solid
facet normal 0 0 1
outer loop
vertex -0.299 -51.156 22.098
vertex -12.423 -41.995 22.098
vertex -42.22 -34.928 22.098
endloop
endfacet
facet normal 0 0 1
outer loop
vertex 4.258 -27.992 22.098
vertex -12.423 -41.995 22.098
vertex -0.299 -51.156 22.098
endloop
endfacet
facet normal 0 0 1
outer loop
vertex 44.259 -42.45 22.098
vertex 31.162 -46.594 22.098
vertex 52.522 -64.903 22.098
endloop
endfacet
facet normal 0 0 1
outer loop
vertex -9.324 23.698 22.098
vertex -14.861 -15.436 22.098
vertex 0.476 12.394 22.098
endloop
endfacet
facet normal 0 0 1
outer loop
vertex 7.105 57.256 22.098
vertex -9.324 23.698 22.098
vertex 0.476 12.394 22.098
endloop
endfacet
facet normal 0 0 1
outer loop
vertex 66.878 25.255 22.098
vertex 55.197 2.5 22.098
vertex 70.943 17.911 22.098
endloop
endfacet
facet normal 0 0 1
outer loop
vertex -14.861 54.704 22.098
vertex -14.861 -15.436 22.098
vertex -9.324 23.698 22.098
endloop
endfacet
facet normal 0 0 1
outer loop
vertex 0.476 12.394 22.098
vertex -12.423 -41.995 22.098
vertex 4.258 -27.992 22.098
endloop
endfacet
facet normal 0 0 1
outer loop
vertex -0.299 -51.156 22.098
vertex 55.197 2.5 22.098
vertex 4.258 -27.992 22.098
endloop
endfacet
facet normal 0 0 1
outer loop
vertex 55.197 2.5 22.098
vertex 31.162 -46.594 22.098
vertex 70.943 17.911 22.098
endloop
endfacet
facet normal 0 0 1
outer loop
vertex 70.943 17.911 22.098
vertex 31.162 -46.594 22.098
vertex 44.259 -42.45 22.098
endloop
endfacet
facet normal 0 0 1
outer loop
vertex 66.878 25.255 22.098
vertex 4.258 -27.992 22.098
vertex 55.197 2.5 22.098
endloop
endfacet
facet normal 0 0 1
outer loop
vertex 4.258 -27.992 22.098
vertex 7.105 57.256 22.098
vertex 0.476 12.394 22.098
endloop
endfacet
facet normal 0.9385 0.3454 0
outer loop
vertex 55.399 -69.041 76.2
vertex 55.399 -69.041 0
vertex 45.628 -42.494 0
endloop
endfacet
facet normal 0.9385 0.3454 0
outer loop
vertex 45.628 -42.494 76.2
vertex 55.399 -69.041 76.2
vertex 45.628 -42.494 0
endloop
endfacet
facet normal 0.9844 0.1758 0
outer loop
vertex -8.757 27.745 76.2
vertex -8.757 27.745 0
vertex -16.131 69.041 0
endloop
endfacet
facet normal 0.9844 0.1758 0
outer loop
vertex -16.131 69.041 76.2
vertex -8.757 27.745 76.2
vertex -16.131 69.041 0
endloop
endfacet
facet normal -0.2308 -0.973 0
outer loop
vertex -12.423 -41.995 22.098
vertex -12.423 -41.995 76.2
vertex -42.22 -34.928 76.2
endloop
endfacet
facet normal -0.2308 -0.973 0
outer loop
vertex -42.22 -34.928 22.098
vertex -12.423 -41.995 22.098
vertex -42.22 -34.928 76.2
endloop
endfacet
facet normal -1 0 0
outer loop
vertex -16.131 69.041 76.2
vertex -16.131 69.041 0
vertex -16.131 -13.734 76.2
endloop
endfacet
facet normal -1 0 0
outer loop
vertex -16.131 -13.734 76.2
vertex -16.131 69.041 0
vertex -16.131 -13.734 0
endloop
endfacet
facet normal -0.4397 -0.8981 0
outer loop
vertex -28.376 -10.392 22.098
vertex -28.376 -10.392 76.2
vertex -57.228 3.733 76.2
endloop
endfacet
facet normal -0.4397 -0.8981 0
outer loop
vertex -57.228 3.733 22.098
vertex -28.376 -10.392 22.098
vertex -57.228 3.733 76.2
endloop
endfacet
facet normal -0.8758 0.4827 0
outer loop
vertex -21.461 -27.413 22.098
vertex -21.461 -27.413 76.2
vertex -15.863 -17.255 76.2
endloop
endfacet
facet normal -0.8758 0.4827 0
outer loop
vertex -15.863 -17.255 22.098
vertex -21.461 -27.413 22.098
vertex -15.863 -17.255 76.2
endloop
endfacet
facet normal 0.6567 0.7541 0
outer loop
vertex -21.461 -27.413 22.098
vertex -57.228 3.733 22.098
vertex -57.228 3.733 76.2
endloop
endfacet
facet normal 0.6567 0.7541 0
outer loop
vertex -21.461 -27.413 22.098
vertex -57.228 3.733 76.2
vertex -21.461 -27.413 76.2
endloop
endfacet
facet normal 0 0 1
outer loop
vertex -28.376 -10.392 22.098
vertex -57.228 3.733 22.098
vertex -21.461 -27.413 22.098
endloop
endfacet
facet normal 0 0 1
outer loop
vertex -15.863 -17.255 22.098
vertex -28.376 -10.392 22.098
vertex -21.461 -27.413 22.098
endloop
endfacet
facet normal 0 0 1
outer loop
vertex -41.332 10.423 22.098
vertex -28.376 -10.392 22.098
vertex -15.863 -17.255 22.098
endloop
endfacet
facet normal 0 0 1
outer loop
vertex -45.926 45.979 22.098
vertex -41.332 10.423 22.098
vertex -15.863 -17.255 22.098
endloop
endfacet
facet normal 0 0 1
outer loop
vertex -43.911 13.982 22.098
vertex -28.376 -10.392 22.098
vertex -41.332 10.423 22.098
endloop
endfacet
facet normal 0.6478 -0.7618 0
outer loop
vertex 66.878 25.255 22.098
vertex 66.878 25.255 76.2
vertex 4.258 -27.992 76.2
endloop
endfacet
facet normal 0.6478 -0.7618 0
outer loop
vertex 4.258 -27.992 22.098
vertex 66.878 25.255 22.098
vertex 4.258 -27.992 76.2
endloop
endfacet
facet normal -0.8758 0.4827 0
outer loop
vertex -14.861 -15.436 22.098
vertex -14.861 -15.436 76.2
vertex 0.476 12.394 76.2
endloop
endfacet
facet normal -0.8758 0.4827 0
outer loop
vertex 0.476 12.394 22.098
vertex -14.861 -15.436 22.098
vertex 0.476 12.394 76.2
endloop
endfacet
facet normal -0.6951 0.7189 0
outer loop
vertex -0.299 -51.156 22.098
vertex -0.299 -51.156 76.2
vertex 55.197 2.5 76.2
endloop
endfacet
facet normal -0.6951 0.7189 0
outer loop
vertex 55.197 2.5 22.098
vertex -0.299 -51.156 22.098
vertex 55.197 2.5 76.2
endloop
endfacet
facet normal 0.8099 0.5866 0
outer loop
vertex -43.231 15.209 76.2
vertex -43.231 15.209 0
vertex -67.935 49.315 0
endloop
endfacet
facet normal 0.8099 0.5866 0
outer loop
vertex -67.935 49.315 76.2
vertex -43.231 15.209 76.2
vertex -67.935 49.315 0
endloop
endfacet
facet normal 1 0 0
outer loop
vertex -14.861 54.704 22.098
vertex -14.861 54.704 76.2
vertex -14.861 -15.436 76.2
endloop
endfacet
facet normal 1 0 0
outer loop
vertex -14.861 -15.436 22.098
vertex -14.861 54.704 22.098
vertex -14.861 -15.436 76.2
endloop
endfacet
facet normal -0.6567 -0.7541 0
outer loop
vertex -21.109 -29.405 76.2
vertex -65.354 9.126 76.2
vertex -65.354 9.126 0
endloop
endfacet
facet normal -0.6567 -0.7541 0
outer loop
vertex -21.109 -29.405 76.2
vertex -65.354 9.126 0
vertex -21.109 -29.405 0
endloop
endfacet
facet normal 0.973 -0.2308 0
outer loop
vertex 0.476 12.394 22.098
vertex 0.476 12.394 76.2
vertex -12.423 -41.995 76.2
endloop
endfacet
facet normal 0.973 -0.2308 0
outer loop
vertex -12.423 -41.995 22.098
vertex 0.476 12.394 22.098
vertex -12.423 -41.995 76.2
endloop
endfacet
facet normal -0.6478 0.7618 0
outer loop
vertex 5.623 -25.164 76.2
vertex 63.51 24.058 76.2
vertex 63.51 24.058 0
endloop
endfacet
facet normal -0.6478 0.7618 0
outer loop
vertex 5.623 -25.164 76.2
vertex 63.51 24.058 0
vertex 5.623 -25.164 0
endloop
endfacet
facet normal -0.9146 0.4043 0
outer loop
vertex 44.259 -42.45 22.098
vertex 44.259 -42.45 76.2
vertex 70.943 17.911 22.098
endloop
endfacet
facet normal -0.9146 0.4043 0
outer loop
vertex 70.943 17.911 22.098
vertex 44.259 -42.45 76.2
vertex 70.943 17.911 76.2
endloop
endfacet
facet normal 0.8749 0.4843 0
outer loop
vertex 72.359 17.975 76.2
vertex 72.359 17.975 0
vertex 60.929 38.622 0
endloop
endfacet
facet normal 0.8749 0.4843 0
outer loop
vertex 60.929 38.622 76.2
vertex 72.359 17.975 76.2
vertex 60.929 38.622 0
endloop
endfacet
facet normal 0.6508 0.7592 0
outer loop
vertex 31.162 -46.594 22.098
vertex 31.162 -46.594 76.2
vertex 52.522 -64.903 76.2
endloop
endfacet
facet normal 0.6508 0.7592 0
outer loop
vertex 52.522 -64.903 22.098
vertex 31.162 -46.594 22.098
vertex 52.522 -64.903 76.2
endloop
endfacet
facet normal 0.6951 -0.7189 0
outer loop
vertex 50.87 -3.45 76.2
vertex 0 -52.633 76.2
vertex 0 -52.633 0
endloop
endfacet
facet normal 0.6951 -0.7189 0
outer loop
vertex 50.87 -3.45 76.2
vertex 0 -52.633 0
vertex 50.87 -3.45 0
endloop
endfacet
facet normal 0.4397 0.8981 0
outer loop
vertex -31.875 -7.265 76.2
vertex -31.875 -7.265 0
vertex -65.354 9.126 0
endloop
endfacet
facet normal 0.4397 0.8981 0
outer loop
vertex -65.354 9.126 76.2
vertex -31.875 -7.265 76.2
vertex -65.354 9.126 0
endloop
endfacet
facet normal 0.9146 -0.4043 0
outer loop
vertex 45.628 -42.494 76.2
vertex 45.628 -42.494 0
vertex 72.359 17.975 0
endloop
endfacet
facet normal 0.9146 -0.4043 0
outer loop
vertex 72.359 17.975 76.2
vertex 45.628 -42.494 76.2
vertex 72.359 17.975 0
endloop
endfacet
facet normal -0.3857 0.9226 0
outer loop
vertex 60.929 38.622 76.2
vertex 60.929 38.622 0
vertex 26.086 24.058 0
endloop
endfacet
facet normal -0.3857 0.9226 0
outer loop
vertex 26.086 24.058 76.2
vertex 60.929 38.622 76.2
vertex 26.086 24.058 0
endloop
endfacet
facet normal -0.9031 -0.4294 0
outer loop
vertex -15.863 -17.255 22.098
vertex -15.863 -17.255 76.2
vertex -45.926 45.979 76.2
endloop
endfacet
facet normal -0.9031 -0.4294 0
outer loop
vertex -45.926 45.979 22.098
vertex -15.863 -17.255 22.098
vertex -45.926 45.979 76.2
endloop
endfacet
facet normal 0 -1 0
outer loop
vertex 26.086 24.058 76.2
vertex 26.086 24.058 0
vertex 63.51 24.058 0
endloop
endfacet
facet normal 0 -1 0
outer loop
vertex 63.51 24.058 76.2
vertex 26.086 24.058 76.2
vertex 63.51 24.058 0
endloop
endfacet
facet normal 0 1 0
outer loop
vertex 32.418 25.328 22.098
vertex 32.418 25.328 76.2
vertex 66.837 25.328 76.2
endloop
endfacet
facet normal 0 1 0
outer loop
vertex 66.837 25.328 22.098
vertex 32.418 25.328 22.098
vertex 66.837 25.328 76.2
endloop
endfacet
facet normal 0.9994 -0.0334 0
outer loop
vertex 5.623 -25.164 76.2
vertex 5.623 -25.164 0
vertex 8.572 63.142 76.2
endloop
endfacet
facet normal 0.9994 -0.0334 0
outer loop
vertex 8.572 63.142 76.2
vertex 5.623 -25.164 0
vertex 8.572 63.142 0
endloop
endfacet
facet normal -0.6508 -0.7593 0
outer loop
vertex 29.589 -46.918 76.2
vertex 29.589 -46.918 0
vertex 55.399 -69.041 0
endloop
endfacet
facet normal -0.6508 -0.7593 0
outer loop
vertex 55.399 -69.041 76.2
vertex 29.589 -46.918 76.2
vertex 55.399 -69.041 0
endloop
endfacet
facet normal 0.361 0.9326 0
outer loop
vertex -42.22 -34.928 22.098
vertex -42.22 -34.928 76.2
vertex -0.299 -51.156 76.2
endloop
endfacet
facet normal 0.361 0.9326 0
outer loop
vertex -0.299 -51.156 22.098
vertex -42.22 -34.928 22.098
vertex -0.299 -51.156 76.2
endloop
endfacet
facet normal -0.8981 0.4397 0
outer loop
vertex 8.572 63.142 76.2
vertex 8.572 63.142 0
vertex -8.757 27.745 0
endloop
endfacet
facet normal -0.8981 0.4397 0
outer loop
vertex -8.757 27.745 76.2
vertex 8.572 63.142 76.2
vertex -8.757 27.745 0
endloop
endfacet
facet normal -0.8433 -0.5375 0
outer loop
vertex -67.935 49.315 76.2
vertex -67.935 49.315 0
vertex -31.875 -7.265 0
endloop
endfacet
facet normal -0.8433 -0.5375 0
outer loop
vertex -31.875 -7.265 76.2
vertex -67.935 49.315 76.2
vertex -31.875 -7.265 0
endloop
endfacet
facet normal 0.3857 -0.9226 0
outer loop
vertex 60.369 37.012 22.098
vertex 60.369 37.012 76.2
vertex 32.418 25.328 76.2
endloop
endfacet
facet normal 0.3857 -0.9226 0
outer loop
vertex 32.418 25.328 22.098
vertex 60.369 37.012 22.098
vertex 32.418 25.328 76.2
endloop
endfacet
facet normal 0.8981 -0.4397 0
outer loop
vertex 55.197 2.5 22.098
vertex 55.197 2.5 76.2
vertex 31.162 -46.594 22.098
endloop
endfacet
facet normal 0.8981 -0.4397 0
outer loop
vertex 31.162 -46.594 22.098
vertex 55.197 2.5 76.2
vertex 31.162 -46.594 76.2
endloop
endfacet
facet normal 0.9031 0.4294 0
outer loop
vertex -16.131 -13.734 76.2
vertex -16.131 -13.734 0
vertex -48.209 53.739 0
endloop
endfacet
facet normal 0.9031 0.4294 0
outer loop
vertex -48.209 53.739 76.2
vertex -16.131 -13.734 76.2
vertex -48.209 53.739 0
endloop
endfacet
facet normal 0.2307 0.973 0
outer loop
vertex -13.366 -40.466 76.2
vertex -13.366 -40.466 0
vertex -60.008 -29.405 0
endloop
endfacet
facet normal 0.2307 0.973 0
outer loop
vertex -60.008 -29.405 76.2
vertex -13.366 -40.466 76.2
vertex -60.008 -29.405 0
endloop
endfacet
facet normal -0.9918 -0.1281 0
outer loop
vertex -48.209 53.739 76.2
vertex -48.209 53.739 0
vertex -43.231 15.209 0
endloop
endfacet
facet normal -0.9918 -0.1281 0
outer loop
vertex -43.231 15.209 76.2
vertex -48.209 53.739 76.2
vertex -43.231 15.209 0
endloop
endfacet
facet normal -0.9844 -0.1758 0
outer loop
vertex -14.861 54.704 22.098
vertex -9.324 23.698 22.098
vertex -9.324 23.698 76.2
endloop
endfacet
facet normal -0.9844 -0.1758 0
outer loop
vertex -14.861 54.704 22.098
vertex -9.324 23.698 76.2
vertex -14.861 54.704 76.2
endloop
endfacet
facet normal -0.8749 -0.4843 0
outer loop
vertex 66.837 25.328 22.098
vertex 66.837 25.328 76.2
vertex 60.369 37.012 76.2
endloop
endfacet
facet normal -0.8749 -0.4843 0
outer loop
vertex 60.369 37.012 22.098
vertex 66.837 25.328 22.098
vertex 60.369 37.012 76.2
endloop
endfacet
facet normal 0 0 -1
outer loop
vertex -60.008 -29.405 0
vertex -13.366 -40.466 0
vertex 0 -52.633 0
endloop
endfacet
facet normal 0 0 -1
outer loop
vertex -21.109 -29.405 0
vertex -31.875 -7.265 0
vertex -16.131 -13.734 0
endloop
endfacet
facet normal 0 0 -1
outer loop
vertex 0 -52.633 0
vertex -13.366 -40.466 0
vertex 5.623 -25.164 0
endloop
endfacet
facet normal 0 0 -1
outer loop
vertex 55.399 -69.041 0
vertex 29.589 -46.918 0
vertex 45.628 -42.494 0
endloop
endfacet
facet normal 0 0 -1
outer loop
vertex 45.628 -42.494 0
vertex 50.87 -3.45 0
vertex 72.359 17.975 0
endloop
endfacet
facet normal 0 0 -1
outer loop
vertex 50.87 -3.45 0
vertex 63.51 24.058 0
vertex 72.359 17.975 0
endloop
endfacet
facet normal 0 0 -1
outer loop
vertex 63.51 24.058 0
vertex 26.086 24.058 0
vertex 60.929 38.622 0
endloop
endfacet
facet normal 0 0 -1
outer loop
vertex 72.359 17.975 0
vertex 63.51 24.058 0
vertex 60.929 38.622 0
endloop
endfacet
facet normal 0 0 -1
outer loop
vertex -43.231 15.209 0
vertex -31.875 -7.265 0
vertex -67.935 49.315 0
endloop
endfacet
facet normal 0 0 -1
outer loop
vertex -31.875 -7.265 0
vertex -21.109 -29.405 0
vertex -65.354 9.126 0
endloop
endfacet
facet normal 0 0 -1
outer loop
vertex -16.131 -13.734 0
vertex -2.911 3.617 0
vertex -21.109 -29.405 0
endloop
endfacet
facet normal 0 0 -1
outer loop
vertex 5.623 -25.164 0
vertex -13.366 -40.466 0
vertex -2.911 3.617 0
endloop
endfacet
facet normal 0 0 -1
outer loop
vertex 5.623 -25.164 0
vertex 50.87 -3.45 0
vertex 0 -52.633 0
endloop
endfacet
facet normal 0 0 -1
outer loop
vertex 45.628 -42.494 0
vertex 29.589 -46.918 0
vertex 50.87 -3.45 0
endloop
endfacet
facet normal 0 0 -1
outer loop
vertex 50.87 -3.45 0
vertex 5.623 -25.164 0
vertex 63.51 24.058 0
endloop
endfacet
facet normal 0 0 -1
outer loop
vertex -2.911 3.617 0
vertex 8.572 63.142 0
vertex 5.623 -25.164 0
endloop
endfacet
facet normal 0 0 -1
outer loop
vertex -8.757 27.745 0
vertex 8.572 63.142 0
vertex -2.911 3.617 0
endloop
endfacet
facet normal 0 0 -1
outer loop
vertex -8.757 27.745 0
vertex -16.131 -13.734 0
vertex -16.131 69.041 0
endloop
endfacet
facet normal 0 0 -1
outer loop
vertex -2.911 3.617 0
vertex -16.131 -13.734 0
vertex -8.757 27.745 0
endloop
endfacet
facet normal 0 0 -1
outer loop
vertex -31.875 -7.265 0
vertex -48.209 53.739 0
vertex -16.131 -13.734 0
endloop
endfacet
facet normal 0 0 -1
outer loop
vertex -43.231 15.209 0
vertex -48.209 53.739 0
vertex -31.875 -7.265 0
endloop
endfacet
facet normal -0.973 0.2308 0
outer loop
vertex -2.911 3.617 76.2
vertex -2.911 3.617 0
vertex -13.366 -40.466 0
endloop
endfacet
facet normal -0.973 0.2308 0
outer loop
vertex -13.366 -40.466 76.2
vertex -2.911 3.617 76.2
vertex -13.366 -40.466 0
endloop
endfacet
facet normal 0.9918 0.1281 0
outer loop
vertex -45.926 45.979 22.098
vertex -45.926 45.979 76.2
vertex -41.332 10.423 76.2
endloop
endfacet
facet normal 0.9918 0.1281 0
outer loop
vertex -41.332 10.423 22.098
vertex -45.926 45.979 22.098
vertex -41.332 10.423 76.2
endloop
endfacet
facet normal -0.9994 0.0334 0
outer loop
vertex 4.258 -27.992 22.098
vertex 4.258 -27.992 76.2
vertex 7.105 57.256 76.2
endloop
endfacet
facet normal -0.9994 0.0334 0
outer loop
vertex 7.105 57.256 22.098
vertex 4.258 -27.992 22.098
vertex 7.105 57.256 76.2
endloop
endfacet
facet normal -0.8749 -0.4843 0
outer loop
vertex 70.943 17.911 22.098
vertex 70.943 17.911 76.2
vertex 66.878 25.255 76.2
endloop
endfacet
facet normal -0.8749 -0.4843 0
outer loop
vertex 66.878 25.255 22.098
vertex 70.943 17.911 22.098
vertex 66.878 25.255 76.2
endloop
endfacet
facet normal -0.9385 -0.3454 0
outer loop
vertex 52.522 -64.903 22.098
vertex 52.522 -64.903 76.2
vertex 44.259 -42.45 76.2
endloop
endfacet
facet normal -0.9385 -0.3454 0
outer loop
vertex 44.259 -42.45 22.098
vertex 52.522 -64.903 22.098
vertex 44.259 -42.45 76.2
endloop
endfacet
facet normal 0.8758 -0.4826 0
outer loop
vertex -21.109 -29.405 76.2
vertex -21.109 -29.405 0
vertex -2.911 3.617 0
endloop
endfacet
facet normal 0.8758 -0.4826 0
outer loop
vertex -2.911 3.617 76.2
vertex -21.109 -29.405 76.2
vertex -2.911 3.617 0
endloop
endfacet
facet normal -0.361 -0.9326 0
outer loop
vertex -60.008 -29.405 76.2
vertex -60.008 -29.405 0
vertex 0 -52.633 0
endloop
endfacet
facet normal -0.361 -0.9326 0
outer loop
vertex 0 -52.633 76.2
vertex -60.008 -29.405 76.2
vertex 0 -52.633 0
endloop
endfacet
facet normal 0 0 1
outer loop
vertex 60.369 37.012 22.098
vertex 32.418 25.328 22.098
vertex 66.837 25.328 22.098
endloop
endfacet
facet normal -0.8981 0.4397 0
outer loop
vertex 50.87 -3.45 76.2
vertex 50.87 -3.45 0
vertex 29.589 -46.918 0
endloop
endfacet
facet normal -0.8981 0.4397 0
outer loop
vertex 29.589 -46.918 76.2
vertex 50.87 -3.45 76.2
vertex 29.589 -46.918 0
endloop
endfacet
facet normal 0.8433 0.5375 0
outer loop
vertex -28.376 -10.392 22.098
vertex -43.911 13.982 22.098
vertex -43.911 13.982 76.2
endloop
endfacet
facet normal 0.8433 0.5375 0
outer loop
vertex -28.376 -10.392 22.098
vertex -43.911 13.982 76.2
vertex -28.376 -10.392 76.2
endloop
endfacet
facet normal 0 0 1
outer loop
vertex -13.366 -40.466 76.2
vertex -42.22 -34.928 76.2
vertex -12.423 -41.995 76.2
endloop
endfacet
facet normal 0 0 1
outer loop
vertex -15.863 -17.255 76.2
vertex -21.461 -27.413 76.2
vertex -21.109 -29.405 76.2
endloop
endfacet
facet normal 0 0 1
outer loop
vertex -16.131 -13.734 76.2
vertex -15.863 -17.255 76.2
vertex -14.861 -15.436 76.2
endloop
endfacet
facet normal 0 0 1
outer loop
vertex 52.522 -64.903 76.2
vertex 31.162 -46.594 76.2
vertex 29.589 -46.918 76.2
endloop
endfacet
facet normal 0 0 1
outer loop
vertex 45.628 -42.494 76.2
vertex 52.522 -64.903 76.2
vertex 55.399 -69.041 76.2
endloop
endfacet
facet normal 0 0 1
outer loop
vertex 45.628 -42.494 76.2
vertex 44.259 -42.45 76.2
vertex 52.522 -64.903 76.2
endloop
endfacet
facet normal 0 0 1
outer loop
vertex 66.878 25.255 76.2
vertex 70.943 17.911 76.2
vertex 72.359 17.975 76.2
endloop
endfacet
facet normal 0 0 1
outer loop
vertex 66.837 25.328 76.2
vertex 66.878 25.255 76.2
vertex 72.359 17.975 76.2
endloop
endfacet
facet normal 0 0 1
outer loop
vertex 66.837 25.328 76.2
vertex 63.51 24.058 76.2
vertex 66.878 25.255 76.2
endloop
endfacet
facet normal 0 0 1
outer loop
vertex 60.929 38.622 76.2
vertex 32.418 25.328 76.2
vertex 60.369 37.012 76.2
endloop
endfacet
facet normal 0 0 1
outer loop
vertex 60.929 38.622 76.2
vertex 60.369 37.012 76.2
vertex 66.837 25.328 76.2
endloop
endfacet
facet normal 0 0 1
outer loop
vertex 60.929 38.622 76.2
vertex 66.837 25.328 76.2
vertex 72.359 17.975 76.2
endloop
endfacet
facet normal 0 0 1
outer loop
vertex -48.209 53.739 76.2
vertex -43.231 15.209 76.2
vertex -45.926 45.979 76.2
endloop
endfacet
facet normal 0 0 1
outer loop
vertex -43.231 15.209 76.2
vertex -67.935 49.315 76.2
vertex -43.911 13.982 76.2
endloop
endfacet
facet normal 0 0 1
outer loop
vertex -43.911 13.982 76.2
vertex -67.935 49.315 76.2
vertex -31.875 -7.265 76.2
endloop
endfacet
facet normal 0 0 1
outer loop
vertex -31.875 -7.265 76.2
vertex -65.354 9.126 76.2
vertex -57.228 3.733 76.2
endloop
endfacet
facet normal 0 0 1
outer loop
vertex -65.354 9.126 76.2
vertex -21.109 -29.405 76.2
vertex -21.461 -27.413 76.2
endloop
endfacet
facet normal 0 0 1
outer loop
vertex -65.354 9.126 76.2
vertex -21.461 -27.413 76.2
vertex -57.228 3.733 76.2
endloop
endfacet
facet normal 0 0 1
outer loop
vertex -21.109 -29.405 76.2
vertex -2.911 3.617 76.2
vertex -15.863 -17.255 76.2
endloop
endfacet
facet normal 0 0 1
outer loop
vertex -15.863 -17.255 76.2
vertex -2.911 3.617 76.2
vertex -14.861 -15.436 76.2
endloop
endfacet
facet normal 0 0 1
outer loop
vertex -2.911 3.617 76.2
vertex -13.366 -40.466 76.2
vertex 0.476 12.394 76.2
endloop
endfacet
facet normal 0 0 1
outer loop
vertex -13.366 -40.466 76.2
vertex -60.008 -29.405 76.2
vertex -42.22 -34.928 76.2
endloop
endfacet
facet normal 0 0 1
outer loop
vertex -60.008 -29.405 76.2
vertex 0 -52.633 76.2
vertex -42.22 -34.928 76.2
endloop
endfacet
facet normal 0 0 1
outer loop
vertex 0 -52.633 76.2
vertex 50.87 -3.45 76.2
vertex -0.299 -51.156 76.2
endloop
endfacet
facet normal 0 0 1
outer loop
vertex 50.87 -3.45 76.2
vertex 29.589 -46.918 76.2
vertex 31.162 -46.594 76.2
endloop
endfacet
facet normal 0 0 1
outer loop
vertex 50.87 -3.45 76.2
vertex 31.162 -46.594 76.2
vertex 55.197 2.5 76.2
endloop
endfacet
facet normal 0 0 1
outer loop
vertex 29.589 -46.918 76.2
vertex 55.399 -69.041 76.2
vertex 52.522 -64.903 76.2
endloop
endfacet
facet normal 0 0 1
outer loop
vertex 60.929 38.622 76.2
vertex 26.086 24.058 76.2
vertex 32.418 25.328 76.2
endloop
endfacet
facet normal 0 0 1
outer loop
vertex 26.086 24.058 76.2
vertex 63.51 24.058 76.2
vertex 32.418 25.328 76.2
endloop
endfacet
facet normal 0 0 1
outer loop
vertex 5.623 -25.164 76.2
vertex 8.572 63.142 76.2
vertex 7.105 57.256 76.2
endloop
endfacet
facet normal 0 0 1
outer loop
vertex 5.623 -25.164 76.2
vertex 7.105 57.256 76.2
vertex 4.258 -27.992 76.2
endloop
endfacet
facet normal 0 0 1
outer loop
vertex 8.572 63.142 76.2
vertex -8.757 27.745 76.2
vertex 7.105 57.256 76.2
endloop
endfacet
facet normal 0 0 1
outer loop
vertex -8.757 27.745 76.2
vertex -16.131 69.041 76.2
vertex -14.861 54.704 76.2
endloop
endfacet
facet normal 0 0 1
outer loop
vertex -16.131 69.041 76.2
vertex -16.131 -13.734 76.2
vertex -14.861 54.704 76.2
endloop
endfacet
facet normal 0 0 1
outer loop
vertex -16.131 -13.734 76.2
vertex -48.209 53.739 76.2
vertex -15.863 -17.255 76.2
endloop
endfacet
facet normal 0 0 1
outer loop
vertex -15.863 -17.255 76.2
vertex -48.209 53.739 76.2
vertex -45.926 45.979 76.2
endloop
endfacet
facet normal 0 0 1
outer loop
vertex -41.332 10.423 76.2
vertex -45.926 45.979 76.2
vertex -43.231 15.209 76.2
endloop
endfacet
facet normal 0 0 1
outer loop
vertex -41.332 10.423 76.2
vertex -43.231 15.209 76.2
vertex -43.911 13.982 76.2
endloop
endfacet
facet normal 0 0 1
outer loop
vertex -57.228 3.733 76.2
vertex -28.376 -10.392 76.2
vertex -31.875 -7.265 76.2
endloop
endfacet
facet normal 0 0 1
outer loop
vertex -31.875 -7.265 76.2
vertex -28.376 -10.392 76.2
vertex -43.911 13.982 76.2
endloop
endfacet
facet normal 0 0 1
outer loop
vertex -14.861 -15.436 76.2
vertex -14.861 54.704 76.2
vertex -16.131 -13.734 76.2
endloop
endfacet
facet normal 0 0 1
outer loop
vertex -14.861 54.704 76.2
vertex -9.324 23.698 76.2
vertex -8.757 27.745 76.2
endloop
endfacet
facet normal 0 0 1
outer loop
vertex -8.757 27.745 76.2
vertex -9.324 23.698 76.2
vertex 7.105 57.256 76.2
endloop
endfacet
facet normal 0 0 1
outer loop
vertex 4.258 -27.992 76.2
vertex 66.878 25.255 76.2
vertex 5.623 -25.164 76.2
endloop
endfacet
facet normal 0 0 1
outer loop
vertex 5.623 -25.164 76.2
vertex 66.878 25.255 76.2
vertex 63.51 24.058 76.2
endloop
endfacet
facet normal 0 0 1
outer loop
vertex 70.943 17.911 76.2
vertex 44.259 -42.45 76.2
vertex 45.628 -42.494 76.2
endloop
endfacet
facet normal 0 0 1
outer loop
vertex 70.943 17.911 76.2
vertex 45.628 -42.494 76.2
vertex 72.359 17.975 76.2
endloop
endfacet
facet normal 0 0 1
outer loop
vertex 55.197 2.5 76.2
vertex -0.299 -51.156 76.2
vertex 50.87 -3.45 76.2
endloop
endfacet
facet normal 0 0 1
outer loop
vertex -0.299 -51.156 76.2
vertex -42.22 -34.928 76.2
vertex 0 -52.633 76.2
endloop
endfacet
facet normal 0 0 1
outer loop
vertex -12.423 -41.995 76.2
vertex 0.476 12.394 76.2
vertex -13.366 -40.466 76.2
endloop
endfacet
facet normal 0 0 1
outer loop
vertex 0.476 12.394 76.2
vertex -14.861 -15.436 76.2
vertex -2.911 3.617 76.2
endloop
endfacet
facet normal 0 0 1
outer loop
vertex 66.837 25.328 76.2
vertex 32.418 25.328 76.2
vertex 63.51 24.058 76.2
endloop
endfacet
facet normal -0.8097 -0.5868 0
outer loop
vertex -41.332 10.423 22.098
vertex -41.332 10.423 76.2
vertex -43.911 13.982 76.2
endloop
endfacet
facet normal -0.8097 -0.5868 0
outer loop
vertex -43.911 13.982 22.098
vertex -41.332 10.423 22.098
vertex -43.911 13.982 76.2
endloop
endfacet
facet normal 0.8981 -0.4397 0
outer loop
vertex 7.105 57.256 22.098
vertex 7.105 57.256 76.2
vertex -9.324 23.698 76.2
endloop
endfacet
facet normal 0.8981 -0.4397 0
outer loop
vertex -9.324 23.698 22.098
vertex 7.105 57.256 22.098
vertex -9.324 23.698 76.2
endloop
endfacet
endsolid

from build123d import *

# Parameters (mm, degrees)
F1_DEPTH = 76.2
F3_DEPTH = 54.102


with BuildPart() as f1:
    # F0 (on Top) → F1 (new body)
    with BuildSketch(Plane.XY):
        Polygon((-48.208792, 53.739436), (-43.231208, 15.209274), (-67.934759, 49.314924), (-31.875403, -7.264898), (-65.353796, 9.125564), (-21.108629, -29.404595), (-2.911252, 3.61714), (-13.365726, -40.465888), (-60.007501, -29.404595), (0, -52.633308), (50.870309, -3.450001), (29.588953, -46.918306), (55.398632, -69.040887), (45.627821, -42.49379), (72.359271, 17.974596), (60.929276, 38.622338), (26.086211, 24.058307), (63.510239, 24.058307), (5.622822, -25.164437), (8.572499, 63.141532), (-8.756855, 27.745403), (-16.131049, 69.040887), (-16.131049, -13.734437), align=None)
    extrude(amount=F1_DEPTH)

    # F2 (on face) → F3 (cut)
    with BuildSketch(Plane.XY.offset(76.2)):
        Polygon((-14.861049, 54.704386), (-14.861049, -15.436109), (0.475501, 12.394247), (-12.423058, -41.994671), (-42.220324, -34.928124), (-0.2989, -51.155774), (55.197442, 2.500153), (31.161853, -46.593818), (52.522279, -64.902753), (44.258507, -42.450249), (70.942717, 17.911278), (66.877654, 25.254621), (4.257654, -27.992326), (7.105206, 57.256262), (-9.324238, 23.698248), align=None)
        Polygon((60.369236, 37.011767), (32.417664, 25.328307), (66.836864, 25.328307), align=None)
        Polygon((-41.332285, 10.422641), (-43.910667, 13.982347), (-28.376483, -10.391947), (-57.22765, 3.733103), (-21.461381, -27.413352), (-15.863477, -17.255159), (-45.925721, 45.979215), align=None)
    extrude(amount=-F3_DEPTH, mode=Mode.SUBTRACT)


solid = f1.part
